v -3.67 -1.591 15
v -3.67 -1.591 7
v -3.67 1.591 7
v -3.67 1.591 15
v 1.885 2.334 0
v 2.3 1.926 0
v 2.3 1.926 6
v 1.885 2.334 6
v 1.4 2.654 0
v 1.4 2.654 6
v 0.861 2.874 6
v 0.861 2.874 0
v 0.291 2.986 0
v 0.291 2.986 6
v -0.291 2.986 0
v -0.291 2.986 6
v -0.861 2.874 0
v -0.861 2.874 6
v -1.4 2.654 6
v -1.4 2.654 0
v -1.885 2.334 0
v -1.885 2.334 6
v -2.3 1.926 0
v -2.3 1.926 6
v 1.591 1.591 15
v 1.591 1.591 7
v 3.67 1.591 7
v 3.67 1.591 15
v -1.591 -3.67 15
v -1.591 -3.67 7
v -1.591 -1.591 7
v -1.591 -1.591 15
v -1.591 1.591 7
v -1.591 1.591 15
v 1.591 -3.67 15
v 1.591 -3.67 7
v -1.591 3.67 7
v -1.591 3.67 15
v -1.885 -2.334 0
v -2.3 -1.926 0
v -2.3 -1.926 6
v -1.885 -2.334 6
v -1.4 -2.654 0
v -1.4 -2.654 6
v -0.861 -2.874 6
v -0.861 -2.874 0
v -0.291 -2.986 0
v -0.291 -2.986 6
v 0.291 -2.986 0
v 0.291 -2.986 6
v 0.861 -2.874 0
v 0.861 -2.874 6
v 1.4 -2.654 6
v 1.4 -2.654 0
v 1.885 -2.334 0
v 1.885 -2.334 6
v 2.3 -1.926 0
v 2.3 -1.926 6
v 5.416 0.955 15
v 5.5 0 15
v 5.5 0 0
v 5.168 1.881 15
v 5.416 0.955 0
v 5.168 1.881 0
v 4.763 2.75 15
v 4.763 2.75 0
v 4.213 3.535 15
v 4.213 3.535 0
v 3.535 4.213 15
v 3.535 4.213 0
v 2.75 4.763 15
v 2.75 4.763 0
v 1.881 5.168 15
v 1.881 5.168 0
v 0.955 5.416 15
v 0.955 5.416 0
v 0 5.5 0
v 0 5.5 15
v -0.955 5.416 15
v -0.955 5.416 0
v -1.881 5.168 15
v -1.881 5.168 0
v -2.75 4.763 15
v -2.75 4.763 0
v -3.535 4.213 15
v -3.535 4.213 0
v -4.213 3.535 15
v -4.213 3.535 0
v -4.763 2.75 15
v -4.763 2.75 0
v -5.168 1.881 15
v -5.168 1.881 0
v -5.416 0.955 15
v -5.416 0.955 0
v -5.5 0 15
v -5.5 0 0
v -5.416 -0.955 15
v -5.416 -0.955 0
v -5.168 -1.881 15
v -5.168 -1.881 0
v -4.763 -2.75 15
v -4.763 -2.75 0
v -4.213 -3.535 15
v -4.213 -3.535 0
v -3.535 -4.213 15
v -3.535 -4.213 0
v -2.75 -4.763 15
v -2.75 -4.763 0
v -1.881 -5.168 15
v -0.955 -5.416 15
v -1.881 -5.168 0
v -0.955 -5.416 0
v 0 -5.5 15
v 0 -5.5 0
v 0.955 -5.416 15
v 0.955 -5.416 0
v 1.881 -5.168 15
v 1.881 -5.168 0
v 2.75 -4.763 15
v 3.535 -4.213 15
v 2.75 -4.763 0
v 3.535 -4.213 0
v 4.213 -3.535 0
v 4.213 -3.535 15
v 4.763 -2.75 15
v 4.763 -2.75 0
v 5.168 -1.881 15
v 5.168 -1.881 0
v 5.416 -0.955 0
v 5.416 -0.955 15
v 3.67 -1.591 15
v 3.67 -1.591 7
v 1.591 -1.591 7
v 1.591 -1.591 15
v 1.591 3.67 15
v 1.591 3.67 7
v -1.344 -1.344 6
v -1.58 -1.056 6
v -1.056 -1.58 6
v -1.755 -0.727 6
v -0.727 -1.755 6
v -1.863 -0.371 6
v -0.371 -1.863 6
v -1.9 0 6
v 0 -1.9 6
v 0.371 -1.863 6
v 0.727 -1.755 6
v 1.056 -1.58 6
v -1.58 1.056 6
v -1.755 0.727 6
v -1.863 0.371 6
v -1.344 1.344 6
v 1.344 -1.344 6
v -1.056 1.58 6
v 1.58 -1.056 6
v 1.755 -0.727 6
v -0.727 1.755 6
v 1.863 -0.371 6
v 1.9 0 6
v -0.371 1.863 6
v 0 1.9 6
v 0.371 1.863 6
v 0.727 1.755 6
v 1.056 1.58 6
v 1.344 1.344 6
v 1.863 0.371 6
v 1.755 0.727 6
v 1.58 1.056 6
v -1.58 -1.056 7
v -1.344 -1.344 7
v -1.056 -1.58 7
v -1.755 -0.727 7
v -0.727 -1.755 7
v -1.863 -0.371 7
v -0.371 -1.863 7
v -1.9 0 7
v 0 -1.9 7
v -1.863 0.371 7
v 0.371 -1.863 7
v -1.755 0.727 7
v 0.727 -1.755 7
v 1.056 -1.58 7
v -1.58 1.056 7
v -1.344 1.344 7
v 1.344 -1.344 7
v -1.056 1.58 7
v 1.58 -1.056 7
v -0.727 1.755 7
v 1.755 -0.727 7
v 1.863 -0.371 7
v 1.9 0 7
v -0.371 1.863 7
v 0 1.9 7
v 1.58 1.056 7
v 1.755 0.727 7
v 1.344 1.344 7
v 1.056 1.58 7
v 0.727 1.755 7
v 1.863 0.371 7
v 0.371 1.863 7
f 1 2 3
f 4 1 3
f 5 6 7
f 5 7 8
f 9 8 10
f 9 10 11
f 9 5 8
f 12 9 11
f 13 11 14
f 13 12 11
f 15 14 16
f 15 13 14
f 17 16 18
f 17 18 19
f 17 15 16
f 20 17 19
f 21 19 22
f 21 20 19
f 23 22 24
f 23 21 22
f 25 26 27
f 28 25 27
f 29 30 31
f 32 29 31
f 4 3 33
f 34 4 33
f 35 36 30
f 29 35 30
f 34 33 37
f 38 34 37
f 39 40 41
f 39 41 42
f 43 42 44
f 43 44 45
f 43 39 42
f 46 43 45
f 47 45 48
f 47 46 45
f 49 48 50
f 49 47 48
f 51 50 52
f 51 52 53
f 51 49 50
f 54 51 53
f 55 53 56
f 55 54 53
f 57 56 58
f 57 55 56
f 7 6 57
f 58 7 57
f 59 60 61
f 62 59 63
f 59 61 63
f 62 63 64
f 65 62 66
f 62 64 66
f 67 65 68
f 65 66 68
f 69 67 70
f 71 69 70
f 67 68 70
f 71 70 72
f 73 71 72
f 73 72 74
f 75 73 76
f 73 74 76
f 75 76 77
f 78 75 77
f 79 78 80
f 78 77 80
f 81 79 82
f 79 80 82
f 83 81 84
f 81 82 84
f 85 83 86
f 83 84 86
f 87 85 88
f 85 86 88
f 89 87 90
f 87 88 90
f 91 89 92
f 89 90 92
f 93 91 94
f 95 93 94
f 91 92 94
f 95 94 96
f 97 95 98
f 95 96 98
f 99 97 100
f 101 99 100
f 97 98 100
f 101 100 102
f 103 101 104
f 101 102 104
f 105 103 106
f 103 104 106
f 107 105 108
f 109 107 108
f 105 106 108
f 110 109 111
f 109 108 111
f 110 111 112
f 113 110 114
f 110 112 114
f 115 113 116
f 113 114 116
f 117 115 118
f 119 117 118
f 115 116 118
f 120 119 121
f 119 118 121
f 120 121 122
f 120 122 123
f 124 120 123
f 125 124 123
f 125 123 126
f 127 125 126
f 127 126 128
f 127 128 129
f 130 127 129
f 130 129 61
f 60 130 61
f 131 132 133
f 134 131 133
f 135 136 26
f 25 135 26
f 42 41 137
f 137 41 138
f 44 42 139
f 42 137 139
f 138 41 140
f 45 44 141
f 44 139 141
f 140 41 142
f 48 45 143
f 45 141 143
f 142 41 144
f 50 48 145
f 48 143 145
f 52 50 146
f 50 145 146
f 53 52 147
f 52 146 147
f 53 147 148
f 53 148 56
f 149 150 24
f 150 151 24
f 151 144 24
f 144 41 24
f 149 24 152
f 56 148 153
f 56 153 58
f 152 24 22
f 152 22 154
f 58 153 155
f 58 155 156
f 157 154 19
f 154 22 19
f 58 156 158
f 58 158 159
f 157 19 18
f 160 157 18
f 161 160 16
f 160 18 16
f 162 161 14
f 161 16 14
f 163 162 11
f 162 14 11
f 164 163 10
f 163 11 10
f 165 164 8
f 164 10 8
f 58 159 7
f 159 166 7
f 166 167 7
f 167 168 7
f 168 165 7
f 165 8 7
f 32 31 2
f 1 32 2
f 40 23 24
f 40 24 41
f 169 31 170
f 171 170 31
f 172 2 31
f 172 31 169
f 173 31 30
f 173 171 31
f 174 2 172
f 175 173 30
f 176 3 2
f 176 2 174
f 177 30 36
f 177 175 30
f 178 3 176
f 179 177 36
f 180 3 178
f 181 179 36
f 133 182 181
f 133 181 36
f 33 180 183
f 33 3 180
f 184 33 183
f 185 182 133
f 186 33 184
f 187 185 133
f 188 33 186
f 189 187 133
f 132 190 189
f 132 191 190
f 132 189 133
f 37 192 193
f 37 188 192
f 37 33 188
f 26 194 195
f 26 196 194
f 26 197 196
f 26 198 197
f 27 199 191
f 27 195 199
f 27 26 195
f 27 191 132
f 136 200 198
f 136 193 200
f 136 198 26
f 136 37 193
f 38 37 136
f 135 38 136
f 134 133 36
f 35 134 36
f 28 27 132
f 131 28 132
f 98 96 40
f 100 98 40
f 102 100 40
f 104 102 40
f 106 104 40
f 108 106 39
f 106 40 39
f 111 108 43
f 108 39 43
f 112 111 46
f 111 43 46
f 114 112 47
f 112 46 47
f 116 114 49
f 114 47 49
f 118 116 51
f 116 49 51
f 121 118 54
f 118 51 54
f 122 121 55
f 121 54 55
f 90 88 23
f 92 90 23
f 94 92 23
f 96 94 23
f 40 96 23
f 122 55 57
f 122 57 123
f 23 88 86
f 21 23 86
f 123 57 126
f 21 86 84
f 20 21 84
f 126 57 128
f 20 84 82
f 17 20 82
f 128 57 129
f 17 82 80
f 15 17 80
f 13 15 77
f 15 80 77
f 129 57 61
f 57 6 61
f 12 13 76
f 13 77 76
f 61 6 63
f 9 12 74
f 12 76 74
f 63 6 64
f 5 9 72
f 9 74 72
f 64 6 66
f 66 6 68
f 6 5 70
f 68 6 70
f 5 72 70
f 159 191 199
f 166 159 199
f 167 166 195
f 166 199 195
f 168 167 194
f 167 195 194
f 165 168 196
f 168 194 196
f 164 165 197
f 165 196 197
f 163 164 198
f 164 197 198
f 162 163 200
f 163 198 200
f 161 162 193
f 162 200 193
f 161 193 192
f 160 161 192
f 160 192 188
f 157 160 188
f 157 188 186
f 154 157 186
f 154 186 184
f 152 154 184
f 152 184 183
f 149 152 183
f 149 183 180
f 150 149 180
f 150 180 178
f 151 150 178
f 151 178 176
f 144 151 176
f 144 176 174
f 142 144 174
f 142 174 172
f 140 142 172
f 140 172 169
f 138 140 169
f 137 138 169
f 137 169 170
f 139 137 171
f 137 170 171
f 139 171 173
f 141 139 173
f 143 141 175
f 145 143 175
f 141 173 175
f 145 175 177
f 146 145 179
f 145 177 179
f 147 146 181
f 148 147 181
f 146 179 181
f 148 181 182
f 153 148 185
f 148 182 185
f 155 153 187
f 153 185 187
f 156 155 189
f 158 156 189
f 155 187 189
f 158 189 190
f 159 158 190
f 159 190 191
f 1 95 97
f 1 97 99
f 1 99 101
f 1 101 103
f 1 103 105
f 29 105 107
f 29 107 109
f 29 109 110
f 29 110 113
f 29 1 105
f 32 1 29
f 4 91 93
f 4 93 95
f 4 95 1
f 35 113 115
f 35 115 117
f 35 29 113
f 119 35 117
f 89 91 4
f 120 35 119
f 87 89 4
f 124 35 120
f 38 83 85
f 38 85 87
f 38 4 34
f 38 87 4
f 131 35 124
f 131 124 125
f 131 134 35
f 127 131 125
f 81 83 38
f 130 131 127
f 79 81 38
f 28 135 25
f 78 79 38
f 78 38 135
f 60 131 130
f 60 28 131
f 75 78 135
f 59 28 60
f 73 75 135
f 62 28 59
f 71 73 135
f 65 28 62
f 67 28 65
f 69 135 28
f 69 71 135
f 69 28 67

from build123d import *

# Parameters (mm, degrees)
SKETCH032_R     = 5.5
PAD020_DEPTH    = 6
SKETCH033_R     = 5.5
PAD021_DEPTH    = 1
SKETCH034_R     = 1.9
POCKET010_DEPTH = 5
SKETCH035_R     = 5.5
PAD022_DEPTH    = 8


with BuildPart() as part:
    # Sketch032 → Pad020 (new body)
    with BuildSketch(Plane.XY):
        Circle(SKETCH032_R)
        with BuildLine():
            Line((-2.3, 1.926136), (-2.3, -1.926136))
            ThreePointArc((-2.3, -1.926136), (0, -3), (2.3, -1.926136))
            Line((2.3, 1.926136), (2.3, -1.926136))
            ThreePointArc((2.3, 1.926136), (0, 3), (-2.3, 1.926136))
        make_face(mode=Mode.SUBTRACT)
    extrude(amount=PAD020_DEPTH)

    # Sketch033 (on Face7 of Pad020) → Pad021 (join)
    with BuildSketch(Plane.XY.offset(6)):
        Circle(SKETCH033_R)
    extrude(amount=PAD021_DEPTH)

    # Sketch034 (on Face1 of Pad021) → Pocket010 (cut)
    with BuildSketch(Plane.XY.offset(7)):
        Circle(SKETCH034_R)
    extrude(amount=-POCKET010_DEPTH, mode=Mode.SUBTRACT)

    # Sketch035 (on Face1 of Pocket010) → Pad022 (join)
    with BuildSketch(Plane.XY.offset(7)):
        Circle(SKETCH035_R)
        Polygon((-3.66998, -1.59099), (-3.66998, 1.59099), (-1.59099, 1.59099), (-1.59099, 3.66998), (1.59099, 3.66998), (1.59099, 1.59099), (3.66998, 1.59099), (3.66998, -1.59099), (1.59099, -1.59099), (1.59099, -3.66998), (-1.59099, -3.66998), (-1.59099, -1.59099), align=None, mode=Mode.SUBTRACT)
    extrude(amount=PAD022_DEPTH)


solid = part.part
